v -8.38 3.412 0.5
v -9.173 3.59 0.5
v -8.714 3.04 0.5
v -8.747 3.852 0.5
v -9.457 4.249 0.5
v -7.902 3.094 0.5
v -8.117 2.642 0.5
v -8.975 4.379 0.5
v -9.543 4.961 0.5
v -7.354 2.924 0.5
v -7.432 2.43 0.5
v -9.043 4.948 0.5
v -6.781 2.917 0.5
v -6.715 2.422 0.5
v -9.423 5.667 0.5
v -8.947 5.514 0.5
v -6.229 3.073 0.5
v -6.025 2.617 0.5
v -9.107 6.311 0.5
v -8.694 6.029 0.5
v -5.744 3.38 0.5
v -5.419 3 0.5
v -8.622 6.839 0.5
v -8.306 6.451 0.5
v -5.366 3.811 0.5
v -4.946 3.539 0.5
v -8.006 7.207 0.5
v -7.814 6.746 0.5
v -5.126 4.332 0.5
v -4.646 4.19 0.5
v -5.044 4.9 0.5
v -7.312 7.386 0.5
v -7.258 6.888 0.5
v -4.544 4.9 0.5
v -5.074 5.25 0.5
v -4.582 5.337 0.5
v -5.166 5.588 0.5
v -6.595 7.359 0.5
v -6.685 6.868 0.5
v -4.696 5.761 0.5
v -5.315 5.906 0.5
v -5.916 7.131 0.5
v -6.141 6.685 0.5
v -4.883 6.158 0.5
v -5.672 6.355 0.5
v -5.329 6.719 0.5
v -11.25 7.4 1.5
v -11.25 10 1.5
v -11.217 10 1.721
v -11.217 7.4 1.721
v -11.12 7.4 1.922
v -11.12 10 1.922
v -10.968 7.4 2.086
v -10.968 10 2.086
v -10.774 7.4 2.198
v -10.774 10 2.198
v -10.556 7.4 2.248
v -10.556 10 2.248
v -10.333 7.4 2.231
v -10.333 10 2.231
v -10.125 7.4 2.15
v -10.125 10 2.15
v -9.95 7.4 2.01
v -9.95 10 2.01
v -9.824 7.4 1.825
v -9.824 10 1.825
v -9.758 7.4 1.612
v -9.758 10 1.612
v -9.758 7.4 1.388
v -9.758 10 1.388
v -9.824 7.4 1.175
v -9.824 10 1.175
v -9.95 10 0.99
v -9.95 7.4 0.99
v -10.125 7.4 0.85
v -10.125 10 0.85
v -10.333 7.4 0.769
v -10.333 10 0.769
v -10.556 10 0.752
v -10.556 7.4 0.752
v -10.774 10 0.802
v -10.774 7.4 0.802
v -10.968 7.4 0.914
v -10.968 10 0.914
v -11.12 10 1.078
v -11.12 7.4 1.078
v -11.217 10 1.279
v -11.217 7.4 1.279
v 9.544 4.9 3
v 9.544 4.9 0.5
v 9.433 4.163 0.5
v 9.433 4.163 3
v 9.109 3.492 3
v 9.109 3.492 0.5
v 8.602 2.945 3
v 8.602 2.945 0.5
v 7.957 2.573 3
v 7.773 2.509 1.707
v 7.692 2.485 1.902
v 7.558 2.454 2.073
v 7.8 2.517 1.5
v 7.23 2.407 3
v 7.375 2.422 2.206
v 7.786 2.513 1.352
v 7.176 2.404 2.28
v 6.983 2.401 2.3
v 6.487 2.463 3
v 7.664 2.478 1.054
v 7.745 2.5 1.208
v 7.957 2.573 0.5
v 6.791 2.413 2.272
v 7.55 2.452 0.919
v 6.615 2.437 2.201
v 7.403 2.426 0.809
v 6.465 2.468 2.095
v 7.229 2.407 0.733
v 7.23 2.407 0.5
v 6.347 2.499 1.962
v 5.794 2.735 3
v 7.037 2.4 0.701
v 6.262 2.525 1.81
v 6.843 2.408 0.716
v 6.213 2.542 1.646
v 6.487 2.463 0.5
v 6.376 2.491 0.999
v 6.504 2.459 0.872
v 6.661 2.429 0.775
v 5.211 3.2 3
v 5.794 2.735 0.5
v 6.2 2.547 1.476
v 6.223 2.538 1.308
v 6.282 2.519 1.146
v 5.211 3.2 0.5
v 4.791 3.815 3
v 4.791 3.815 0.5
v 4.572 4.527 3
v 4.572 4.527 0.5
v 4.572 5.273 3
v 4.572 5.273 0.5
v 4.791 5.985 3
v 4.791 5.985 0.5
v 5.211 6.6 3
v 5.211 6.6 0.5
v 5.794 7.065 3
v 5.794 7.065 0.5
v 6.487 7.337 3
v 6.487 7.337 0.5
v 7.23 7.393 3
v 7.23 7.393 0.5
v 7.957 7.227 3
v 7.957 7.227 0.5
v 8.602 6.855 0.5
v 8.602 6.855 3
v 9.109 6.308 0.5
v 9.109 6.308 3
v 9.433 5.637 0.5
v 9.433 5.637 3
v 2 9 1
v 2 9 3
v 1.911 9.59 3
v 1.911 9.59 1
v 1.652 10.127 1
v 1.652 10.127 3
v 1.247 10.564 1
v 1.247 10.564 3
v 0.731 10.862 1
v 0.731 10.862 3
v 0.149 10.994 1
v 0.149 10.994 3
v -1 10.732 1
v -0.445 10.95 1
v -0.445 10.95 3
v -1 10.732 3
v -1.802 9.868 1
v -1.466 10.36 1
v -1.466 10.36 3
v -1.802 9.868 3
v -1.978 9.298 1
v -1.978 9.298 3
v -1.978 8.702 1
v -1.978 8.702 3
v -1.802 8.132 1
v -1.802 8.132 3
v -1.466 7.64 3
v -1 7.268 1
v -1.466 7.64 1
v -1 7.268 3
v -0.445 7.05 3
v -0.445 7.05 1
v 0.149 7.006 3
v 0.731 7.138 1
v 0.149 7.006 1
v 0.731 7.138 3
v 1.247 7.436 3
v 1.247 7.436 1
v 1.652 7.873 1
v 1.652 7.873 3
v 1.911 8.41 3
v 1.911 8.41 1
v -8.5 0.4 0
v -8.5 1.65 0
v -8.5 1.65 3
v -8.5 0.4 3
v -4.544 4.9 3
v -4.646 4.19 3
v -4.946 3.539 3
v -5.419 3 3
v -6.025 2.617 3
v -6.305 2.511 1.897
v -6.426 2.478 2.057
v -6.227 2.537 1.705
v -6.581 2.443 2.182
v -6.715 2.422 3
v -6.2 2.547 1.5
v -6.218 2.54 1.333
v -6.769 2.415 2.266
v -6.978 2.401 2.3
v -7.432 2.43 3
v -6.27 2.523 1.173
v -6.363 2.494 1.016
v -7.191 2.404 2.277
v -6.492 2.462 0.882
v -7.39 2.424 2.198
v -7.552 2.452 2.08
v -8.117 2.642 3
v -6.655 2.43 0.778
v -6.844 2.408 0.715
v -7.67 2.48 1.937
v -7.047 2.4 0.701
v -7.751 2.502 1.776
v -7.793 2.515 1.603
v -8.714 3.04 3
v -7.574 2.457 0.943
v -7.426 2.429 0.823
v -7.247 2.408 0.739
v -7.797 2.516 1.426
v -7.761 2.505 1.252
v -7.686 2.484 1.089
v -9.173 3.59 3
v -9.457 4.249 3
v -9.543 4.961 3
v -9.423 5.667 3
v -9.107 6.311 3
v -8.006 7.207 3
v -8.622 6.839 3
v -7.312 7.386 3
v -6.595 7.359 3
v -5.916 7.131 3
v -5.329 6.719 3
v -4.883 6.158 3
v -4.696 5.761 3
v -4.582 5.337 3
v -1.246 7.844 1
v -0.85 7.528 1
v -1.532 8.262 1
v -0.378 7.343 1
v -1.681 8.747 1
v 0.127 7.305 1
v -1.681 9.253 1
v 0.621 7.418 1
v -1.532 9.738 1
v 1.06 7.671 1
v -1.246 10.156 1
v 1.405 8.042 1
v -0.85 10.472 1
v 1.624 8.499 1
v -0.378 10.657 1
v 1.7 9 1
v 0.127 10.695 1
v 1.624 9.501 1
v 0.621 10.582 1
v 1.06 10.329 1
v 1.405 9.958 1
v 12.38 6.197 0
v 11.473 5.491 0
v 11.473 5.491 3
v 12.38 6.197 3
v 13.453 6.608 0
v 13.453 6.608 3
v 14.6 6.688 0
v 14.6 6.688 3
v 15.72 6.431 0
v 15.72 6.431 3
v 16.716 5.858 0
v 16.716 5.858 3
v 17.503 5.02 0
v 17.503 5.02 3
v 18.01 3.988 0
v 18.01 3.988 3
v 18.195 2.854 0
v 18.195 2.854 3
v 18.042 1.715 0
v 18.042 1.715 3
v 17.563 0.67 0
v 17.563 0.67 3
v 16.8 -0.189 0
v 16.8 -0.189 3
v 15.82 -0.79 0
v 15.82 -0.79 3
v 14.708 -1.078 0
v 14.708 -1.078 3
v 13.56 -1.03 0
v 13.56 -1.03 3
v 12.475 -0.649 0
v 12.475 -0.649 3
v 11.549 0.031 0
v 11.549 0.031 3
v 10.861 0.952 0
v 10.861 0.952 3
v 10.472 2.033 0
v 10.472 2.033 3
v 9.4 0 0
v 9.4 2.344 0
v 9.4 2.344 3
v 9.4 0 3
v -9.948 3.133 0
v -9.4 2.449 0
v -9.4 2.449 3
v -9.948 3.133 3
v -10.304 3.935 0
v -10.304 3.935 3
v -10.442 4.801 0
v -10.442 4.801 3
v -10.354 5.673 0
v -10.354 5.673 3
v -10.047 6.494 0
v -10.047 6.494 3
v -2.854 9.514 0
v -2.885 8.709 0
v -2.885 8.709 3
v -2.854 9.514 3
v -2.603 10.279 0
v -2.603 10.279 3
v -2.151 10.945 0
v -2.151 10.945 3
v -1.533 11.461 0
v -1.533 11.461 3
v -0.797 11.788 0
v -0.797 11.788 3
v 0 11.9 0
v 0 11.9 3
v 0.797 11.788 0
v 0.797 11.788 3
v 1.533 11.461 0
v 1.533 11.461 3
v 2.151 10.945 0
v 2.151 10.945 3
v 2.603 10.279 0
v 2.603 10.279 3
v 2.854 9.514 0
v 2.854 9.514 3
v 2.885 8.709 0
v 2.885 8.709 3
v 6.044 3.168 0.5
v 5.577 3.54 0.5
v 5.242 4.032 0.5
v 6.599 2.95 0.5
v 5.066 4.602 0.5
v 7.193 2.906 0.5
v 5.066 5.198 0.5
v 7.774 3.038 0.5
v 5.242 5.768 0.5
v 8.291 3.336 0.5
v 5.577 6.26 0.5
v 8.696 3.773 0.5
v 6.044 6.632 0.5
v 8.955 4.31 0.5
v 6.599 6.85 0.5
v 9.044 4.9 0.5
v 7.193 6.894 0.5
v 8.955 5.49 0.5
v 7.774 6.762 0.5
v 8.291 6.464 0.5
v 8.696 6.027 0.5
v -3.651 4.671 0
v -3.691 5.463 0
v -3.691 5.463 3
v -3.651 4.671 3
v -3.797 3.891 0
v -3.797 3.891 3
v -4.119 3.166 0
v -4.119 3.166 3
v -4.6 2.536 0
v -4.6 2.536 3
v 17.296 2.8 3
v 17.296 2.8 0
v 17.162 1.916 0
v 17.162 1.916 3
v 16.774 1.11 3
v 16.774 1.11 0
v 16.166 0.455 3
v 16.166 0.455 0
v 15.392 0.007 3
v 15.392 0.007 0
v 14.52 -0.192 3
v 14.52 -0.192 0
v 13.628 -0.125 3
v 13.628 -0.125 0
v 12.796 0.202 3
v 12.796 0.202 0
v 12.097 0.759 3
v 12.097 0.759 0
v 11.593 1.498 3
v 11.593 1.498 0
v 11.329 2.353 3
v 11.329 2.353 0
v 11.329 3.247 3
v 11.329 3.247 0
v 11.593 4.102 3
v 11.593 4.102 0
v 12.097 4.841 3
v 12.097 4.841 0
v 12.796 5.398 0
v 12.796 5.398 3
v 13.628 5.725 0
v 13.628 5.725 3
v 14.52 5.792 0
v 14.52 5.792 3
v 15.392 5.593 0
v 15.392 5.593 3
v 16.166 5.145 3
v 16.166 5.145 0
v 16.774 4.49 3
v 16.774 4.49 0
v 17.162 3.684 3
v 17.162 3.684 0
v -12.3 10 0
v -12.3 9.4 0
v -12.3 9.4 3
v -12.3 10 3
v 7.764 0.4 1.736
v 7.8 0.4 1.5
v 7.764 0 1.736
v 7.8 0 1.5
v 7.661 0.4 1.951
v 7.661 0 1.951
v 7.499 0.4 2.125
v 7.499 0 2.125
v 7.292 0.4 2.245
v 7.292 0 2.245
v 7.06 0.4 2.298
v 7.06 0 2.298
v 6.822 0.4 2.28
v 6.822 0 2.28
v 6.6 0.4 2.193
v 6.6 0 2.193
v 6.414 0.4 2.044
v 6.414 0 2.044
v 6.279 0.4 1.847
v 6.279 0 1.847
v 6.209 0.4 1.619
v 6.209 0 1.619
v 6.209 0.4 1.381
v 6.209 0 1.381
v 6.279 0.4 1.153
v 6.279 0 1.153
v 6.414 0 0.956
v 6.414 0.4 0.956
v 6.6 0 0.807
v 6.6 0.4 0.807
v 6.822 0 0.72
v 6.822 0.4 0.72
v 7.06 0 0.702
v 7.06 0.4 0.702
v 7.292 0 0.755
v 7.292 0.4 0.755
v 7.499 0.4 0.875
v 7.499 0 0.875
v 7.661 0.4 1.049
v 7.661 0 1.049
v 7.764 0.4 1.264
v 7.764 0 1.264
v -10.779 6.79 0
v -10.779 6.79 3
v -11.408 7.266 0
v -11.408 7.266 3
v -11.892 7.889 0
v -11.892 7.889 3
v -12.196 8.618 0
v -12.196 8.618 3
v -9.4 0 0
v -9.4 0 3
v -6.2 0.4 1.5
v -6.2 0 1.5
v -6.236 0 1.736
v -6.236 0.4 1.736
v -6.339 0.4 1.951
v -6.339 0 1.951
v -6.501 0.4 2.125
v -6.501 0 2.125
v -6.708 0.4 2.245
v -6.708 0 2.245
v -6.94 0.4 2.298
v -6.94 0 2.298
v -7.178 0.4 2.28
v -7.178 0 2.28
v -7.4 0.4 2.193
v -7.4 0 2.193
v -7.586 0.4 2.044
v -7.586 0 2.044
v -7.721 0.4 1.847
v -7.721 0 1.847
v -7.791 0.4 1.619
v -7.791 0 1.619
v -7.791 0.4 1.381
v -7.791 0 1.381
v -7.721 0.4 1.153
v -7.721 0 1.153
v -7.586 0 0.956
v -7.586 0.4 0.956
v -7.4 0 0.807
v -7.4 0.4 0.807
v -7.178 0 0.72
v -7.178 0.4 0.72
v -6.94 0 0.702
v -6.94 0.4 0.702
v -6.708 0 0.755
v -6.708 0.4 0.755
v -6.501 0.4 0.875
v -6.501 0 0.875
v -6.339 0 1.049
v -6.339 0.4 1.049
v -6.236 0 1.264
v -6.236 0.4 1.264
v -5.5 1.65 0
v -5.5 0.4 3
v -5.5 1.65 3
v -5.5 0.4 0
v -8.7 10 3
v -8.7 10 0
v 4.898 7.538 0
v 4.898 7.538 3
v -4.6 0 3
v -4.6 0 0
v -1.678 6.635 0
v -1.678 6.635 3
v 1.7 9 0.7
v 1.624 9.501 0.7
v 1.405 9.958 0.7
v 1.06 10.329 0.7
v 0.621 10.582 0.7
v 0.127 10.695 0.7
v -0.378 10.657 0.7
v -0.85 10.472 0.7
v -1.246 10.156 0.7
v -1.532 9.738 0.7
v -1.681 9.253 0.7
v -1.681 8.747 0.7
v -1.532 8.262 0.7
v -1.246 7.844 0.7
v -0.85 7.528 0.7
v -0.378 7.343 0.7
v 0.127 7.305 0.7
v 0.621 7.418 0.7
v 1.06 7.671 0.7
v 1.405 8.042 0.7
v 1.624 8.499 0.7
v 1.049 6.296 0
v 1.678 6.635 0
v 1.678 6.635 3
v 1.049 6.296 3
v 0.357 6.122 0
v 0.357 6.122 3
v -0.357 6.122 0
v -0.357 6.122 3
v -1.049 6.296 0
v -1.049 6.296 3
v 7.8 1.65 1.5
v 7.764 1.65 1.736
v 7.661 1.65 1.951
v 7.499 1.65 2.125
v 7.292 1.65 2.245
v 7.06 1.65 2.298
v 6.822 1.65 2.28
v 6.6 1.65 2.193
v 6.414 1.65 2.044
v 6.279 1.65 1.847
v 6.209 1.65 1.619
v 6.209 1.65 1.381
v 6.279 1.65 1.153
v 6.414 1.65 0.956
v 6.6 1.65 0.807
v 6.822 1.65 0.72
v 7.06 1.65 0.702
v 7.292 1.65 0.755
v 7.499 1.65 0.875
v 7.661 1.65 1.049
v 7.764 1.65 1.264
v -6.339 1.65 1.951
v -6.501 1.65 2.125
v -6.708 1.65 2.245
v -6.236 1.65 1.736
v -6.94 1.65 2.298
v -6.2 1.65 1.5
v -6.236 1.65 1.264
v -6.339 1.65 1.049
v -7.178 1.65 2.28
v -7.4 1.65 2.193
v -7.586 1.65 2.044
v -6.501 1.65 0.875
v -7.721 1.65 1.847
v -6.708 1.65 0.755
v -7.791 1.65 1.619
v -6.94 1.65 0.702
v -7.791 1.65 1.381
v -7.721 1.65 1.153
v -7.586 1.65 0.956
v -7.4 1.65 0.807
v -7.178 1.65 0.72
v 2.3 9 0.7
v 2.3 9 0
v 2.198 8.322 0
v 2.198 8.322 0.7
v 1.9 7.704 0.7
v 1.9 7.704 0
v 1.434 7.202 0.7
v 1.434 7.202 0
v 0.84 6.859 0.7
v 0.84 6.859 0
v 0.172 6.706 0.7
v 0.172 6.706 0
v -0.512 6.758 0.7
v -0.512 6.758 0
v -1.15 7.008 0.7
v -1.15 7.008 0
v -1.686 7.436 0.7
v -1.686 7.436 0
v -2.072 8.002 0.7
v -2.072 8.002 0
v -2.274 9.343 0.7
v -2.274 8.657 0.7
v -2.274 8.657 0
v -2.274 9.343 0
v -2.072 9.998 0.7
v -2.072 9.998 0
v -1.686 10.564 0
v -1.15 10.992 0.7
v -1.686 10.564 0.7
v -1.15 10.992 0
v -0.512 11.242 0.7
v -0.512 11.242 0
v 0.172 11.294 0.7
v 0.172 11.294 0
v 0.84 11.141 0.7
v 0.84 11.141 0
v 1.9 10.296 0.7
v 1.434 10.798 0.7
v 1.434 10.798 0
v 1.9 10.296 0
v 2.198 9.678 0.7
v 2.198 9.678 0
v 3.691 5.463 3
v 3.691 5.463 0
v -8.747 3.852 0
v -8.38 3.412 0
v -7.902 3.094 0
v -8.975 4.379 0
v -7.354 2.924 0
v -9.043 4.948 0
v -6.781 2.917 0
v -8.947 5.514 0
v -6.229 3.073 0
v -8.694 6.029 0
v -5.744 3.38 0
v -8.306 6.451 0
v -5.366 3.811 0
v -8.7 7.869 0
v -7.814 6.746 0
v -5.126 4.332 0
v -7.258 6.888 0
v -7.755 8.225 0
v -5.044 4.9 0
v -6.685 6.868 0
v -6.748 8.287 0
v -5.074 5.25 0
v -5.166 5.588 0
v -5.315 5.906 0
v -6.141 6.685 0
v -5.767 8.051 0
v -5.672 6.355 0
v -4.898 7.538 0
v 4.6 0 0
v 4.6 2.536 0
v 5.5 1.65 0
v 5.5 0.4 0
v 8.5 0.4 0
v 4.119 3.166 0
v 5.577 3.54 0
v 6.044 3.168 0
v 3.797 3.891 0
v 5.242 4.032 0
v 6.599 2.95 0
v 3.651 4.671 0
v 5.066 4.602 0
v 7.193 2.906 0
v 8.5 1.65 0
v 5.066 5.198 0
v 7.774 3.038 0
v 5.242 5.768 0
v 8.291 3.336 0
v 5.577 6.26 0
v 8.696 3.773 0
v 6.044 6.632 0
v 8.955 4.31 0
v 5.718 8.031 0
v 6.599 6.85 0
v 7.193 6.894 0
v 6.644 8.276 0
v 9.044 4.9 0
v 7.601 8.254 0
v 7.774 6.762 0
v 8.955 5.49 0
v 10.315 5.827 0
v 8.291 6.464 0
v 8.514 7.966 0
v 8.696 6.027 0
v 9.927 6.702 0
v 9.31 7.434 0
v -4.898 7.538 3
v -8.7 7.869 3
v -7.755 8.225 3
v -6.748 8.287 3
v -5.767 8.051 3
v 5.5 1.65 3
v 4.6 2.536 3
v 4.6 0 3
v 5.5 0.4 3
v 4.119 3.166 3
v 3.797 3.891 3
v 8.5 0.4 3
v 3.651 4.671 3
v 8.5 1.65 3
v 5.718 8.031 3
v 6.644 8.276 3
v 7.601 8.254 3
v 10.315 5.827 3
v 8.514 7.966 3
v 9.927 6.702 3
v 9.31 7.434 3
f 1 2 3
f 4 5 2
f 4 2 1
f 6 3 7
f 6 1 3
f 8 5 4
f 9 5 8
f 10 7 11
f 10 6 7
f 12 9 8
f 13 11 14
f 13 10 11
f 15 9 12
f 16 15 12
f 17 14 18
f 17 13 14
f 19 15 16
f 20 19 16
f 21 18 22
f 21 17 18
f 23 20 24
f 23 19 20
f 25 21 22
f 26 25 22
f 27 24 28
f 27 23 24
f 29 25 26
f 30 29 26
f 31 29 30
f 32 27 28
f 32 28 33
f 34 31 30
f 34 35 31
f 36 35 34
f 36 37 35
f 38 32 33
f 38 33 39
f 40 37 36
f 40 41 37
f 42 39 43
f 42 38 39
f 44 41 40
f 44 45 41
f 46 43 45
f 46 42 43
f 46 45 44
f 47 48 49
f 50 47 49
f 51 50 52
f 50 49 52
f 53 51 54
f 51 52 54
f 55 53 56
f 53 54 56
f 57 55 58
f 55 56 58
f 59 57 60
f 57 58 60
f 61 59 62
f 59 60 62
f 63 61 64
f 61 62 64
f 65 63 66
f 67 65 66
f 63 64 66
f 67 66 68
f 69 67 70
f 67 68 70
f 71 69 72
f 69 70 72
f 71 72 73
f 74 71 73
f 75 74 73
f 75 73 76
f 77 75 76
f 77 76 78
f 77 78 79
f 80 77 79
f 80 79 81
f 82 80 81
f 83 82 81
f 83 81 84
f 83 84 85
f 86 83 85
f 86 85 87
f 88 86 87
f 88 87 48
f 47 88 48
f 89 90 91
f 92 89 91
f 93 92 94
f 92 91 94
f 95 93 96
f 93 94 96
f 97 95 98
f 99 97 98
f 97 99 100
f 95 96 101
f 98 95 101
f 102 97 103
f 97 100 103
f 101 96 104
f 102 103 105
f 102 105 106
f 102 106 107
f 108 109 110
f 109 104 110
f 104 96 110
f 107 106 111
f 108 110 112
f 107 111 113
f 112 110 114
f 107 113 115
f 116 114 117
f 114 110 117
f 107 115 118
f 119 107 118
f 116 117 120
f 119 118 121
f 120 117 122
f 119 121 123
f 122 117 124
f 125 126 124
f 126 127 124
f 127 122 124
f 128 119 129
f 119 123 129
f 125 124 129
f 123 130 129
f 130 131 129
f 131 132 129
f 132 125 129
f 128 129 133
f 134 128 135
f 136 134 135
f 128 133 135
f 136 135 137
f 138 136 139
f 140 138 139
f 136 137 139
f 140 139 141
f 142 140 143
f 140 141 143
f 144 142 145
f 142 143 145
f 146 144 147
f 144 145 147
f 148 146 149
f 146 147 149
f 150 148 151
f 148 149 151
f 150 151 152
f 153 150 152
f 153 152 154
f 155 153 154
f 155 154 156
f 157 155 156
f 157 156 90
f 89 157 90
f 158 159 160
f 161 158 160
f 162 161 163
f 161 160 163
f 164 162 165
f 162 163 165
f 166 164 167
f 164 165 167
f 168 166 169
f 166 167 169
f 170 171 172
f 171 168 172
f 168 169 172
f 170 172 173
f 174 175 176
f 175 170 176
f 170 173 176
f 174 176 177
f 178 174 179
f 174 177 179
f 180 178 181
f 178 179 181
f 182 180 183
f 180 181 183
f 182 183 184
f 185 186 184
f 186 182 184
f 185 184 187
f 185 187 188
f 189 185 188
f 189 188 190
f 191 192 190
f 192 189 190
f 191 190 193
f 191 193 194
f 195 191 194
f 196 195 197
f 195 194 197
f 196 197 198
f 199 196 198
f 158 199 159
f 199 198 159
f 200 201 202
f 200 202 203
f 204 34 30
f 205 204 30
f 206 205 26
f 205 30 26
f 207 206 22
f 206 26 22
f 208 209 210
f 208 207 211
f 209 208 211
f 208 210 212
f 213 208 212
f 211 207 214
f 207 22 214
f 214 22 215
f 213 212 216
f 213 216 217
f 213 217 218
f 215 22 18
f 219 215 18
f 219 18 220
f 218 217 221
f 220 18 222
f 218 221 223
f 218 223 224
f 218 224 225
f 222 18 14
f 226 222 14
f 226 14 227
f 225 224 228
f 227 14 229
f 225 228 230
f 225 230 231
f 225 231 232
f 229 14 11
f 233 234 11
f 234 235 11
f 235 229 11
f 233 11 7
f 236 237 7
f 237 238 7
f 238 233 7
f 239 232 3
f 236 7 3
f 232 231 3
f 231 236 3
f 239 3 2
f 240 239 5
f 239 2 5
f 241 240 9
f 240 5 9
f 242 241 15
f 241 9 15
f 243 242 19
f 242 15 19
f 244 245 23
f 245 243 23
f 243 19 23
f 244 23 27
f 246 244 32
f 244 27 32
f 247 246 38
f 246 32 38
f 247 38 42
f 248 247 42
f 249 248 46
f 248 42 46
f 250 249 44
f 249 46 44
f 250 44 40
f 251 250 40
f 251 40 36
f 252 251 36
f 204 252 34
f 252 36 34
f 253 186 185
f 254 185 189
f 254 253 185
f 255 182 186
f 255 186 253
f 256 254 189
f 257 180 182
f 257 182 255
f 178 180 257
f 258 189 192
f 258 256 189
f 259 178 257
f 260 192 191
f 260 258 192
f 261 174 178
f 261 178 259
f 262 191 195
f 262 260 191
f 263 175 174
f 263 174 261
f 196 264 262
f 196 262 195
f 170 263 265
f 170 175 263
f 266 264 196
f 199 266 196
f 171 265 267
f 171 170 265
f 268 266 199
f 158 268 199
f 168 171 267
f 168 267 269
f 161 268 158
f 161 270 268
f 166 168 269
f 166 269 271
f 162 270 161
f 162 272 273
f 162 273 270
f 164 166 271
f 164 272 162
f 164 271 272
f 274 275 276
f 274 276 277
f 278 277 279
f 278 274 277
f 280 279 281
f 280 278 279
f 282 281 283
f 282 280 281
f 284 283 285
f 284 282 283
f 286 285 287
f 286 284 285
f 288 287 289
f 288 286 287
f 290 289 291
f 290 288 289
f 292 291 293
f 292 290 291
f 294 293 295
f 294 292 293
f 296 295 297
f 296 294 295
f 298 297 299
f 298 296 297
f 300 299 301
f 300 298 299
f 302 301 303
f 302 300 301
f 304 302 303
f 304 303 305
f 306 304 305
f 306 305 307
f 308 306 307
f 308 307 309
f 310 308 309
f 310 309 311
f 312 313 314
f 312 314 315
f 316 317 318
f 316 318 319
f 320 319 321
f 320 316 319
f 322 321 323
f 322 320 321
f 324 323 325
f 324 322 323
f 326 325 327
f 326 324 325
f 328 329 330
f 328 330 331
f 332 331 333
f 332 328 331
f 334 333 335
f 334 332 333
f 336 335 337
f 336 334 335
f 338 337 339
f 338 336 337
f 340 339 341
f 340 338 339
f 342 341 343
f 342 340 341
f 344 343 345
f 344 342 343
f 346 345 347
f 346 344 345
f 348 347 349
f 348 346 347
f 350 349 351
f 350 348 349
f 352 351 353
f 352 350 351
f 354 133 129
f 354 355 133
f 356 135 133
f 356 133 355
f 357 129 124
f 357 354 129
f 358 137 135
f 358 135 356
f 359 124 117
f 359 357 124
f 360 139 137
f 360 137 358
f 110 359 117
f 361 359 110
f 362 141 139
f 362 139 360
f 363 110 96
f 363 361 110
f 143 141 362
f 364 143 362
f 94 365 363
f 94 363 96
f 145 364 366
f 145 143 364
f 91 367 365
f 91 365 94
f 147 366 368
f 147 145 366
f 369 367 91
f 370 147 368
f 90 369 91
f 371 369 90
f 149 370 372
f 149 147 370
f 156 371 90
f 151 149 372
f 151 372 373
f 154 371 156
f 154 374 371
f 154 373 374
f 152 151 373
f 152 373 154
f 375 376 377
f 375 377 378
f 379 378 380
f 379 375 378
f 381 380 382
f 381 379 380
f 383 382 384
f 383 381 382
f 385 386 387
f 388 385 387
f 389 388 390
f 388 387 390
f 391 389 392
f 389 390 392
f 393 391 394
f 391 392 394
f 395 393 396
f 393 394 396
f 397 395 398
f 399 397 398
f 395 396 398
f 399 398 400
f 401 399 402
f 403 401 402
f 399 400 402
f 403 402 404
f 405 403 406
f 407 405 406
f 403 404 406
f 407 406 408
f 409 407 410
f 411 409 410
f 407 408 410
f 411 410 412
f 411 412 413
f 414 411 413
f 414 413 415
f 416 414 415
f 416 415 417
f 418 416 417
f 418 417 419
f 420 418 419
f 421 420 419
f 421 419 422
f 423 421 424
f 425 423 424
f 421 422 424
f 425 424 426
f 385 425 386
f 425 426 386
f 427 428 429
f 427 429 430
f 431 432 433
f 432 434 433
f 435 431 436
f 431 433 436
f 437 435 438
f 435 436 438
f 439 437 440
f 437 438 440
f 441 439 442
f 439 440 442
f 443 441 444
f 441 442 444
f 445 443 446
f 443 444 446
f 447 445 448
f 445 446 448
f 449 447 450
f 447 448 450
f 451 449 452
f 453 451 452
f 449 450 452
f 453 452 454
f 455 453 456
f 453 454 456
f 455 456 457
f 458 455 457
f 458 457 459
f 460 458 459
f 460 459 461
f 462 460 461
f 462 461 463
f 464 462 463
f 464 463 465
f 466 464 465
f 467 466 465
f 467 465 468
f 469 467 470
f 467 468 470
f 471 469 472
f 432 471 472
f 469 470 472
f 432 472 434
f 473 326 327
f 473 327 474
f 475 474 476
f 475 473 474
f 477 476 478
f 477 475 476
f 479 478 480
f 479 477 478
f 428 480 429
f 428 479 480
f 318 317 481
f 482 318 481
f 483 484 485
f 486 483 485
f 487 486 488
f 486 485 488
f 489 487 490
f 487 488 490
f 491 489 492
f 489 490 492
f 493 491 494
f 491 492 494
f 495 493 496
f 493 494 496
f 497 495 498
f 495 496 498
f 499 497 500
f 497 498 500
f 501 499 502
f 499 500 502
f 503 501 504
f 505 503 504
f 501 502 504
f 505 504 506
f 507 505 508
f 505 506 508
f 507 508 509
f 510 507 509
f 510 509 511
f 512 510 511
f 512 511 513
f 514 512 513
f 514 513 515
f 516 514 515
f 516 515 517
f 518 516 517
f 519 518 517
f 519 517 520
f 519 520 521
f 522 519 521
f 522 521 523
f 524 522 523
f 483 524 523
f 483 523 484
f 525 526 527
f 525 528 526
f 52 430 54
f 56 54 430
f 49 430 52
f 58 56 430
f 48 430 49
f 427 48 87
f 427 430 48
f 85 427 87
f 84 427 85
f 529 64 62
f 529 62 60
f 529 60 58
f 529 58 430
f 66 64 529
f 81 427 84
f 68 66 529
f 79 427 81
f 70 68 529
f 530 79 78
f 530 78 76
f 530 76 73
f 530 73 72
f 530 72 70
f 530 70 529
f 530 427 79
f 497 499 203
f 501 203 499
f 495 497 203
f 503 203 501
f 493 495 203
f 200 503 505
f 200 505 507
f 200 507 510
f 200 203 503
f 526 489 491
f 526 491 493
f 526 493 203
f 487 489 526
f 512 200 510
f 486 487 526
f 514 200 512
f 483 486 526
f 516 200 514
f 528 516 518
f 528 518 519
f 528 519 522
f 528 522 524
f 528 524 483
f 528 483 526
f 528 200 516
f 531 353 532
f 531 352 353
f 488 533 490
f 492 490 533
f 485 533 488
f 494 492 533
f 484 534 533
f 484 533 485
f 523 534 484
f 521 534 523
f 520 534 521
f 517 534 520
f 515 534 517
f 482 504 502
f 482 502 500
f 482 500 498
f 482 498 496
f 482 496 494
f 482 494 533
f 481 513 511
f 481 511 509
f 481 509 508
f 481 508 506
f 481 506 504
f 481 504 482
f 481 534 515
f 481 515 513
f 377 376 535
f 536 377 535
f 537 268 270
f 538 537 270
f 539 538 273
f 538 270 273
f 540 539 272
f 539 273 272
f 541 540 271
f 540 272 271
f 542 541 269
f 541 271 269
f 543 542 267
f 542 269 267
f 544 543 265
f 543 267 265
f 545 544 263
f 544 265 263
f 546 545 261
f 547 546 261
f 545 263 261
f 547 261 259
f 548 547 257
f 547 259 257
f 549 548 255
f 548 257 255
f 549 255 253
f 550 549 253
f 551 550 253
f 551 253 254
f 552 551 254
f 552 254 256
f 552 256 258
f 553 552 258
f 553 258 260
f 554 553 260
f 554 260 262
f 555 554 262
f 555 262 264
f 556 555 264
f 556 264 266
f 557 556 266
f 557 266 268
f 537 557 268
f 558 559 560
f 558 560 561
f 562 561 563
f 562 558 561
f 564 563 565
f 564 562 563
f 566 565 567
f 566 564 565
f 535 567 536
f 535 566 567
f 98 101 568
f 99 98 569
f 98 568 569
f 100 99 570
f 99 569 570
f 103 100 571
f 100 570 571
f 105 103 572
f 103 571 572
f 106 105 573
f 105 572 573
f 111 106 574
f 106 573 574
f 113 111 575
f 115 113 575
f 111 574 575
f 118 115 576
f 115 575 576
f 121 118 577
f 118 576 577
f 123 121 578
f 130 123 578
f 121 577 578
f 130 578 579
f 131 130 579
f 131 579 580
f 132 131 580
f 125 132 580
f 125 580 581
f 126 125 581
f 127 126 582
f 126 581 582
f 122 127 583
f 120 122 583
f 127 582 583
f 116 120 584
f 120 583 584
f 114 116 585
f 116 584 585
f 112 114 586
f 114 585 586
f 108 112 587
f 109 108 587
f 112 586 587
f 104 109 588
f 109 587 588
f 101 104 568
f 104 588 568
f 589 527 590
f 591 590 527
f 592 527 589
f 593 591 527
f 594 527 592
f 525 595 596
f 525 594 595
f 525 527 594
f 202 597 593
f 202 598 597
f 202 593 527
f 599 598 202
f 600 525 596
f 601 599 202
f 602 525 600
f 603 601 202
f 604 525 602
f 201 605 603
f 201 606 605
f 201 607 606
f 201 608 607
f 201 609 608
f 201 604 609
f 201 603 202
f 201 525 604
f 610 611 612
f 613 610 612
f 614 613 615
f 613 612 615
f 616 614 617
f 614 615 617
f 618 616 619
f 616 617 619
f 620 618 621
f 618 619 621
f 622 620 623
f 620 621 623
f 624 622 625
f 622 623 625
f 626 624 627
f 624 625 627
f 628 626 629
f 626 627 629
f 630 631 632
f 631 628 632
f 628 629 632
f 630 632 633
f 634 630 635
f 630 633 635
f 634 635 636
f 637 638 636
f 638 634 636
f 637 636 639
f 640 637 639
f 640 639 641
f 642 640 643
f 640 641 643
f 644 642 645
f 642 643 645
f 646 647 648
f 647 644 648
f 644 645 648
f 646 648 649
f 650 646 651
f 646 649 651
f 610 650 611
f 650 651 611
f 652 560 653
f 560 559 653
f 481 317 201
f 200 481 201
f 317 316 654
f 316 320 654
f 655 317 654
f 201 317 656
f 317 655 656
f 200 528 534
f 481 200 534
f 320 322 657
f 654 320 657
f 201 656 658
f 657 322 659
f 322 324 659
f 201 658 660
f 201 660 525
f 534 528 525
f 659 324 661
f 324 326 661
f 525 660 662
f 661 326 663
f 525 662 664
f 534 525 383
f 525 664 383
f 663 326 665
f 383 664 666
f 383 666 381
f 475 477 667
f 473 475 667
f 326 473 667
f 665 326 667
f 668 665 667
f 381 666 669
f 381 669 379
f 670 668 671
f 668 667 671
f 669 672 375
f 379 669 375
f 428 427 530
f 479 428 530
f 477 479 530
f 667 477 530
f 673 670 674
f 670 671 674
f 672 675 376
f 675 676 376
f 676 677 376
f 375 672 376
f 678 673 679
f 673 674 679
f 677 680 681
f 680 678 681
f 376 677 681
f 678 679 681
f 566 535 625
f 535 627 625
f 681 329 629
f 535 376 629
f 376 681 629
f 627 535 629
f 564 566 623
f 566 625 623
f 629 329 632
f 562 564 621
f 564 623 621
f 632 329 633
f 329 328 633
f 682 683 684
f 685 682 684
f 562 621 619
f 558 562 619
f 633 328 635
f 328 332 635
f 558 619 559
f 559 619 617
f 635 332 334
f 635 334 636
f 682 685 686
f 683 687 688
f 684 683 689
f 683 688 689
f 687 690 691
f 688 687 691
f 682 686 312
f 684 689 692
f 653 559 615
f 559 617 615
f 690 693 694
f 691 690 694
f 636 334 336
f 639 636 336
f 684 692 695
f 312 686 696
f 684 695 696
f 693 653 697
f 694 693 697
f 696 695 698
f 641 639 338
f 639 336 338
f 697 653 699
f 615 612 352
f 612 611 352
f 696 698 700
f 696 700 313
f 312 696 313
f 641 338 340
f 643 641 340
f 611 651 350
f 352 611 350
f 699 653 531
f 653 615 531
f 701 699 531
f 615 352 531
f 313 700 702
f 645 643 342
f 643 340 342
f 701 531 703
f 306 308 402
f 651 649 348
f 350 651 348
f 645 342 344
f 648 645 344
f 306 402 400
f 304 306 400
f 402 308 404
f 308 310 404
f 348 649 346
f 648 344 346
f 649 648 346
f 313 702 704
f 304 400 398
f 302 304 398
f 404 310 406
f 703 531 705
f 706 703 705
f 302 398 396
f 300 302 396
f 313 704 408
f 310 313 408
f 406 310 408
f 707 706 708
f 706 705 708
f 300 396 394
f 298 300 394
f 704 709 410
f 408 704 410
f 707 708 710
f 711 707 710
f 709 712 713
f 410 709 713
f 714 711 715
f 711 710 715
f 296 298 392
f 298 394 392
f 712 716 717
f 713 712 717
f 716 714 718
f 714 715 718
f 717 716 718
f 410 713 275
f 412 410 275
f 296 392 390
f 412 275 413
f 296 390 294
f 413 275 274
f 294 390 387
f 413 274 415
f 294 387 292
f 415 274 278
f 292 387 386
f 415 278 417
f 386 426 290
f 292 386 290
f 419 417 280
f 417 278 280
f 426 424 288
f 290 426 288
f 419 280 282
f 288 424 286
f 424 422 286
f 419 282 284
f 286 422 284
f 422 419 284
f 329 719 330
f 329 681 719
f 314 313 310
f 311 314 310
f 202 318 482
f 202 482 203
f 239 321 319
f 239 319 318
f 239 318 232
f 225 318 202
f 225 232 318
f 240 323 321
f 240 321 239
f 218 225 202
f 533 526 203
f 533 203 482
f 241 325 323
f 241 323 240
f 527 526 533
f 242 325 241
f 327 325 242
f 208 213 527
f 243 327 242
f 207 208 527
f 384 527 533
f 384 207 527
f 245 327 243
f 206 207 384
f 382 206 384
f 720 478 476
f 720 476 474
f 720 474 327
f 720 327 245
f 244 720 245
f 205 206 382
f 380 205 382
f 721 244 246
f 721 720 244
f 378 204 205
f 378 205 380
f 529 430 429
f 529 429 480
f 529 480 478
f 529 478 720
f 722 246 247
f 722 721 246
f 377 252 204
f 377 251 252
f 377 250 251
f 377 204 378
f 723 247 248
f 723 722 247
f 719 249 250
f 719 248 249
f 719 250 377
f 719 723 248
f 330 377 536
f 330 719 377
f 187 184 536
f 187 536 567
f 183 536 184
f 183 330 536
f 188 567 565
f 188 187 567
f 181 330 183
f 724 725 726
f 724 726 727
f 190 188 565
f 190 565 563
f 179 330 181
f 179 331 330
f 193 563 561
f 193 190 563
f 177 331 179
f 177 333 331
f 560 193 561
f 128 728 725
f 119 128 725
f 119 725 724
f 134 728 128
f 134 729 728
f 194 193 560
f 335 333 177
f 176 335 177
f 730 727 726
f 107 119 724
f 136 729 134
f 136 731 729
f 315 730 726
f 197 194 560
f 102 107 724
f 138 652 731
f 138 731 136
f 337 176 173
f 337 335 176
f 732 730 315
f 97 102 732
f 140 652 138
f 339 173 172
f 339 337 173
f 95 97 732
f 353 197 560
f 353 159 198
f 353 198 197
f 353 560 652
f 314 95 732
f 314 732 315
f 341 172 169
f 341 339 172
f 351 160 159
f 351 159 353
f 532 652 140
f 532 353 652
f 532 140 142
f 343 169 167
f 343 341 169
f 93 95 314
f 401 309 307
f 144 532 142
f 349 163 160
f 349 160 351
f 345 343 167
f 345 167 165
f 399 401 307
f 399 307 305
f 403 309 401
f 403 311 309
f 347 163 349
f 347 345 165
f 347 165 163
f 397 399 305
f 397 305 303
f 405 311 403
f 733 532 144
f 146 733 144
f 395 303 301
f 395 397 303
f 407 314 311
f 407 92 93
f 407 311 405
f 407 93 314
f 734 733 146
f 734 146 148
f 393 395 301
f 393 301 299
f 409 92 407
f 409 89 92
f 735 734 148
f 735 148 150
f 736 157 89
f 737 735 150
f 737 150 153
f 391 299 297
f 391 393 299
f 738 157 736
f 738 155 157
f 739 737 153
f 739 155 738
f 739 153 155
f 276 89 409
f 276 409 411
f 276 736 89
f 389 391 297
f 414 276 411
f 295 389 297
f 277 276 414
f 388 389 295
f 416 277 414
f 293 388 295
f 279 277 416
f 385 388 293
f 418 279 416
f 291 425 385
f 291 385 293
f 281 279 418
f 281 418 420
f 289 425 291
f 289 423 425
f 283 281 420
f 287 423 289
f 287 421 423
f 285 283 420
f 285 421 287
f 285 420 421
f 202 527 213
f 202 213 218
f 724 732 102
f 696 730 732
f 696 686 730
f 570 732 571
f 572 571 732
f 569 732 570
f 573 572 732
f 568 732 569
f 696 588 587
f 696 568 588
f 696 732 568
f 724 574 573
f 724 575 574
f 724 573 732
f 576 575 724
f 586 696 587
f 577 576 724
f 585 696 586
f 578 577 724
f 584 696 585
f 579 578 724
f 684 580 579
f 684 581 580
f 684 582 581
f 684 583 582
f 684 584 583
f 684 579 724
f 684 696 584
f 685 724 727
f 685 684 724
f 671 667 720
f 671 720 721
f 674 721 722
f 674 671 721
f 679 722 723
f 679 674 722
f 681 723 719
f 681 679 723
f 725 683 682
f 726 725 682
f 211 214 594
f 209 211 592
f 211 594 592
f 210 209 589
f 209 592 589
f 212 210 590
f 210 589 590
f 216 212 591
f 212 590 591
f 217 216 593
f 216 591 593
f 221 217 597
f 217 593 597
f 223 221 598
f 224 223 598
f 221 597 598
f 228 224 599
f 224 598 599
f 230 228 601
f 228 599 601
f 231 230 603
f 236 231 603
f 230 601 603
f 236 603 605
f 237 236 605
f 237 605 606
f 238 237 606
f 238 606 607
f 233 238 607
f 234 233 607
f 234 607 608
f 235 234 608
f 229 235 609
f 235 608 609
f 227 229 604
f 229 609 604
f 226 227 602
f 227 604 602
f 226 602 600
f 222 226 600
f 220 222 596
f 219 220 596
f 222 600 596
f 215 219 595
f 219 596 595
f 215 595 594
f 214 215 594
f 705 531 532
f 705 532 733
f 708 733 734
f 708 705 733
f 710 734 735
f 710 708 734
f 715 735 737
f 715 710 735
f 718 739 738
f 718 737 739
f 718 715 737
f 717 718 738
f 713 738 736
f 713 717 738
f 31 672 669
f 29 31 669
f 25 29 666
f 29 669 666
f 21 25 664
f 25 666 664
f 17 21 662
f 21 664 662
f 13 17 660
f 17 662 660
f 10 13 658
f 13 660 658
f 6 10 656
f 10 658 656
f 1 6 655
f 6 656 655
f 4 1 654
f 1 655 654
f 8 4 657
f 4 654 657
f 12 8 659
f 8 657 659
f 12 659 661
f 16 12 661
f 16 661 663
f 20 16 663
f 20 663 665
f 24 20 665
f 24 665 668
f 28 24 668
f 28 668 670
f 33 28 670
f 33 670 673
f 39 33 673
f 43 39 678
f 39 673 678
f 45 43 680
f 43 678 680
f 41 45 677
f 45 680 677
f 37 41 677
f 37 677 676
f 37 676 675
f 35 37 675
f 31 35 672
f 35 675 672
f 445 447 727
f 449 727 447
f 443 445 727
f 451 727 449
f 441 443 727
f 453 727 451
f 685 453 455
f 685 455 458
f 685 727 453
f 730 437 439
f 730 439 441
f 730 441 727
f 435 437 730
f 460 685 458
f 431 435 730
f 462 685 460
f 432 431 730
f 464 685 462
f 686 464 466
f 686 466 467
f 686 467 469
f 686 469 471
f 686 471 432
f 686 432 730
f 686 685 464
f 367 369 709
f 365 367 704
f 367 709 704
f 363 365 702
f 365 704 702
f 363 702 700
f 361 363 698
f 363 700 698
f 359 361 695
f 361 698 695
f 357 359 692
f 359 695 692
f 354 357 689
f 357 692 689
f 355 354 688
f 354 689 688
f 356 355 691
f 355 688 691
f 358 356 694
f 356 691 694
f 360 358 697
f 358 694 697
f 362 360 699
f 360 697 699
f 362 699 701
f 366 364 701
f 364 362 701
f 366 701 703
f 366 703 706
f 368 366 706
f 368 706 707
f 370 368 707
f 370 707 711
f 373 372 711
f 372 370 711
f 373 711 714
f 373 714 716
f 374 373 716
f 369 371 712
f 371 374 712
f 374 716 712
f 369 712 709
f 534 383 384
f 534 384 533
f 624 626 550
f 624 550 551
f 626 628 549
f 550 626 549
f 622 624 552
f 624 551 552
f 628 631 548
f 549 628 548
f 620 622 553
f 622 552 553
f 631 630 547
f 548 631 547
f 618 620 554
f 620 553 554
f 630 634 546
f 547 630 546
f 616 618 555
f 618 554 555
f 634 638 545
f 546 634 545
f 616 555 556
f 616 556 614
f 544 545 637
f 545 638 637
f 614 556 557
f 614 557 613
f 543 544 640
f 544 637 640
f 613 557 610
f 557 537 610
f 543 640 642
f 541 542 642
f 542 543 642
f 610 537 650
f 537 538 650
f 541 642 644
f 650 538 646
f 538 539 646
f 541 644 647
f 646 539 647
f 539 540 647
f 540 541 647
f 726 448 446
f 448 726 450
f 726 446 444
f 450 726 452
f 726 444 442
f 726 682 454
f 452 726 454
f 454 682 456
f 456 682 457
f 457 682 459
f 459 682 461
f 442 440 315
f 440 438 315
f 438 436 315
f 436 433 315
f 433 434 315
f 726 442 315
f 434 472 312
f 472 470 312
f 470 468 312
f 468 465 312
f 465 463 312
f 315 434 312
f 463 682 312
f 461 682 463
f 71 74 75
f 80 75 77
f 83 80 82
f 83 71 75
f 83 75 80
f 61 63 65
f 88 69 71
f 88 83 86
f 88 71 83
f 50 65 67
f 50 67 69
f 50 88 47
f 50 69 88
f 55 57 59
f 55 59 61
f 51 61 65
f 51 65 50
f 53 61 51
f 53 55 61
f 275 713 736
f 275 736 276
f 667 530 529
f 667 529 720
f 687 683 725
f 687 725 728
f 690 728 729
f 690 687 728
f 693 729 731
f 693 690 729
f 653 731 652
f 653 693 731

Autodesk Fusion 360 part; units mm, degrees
sketch "スケッチ1" plane through (0, 0, 0) normal (0, 0, 1) x (1, 0, 0)
  line L0 (0, 0) -> (18.1957, 0)
  line L1 (18.1957, 0) -> (18.1957, 13.2439)
  line L2 (18.1957, 13.2439) -> (0, 13.2439)
  line L3 (0, 13.2439) -> (0, 0)
  line L4 (0, 0) -> (-13.9996, 0)
  line L5 (-13.9996, 0) -> (-13.9996, 13.2439)
  line L6 (-13.9996, 13.2439) -> (0, 13.2439)
  line L7 (0, 13.2439) -> (0, 0)
  circle A0 centre (-7.0436, 4.9) radius 2
  circle A1 centre (7.0436, 4.9) radius 2
  circle A2 centre (0, 9) radius 2
  circle A3 centre (14.2957, 2.8) radius 3
  circle A4 centre (-7.0436, 4.9) radius 2.5
  circle A5 centre (7.0436, 4.9) radius 2.5
  circle A6 centre (0, 9) radius 2.3
  circle A7 centre (0, 9) radius 1.7
  line L8 (-7, 1.5003) -> (-7, 0)
  line L9 (7, 1.5003) -> (7, 0)
  circle A8 centre (-7.0436, 4.9) radius 3.4
  circle A9 centre (0, 9) radius 2.9
  line L10 (-7.0436, 4.9) -> (0, 9)
  line L11 (0, 9) -> (7.0436, 4.9)
  line L12 (7.0436, 4.9) -> (14.2957, 2.8)
  circle A10 centre (7.0436, 4.9) radius 3.4
  circle A11 centre (14.2957, 2.8) radius 3.9
  line L13 (-4.6, 2.5359) -> (-4.6, 0)
  line L14 (4.6, 2.5359) -> (4.6, 0)
  line L15 (-9.4, 2.449) -> (-9.4, 0)
  line L16 (9.4, 2.449) -> (9.4, 0)
  line L17 (-3.6906, 5.4633) -> (-1.678, 6.6348)
  line L18 (1.678, 6.6348) -> (3.6906, 5.4633)
  line L19 (-4.898, 7.5375) -> (-2.8854, 8.709)
  line L20 (2.8854, 8.709) -> (4.898, 7.5375)
  line L21 (10.3149, 5.8267) -> (11.4731, 5.4913)
  line L22 (9.3136, 2.3687) -> (10.4718, 2.0333)
  line L23 (0, 0) -> (18.1957, 0)
  line L24 (18.1957, 0) -> (18.1957, -2.0683)
  line L25 (18.1957, -2.0683) -> (0, -2.0683)
  line L26 (-13.9996, 0) -> (0, 0)
  line L27 (0, -2.0683) -> (-13.9996, -2.0683)
  line L28 (-13.9996, -2.0683) -> (-13.9996, 0)
  line L29 (-12.3, 6.4) -> (-12.3, 10)
  line L30 (-12.3, 10) -> (-8.7, 10)
  line L31 (-8.7, 10) -> (-8.7, 7.8692)
  line L32 (-12.3, 6.4) -> (-10.0948, 6.4)
  line L33 (-5.5, 1.65) -> (-8.5, 1.65)
  line L34 (-8.5, 1.65) -> (-8.5, 0.4)
  line L35 (-8.5, 0.4) -> (-5.5, 0.4)
  line L36 (-5.5, 0.4) -> (-5.5, 1.65)
  line L37 (-5.5, 1.65) -> (-8.5, 0.4) construction
  line L38 (-8.5, 1.65) -> (-5.5, 0.4) construction
  line L39 (8.5, 1.65) -> (5.5, 1.65)
  line L40 (5.5, 1.65) -> (5.5, 0.4)
  line L41 (5.5, 0.4) -> (8.5, 0.4)
  line L42 (8.5, 0.4) -> (8.5, 1.65)
  line L43 (8.5, 1.65) -> (5.5, 0.4) construction
  line L44 (5.5, 1.65) -> (8.5, 0.4) construction
  arc A12 (-12.3, 9.4) -> (-9.3, 6.4) centre (-9.3, 9.4) ccw
  point P0 (-7, 1.5003)
  point P1 (7, 1.5003)
  point P2 (-10.5, 10)
  point P3 (-7, 1.025)
  point P4 (7, 1.025)
  dimension "d4" = 4
  dimension "d5" = 4.9
  dimension "d6" = 8.15
  dimension "d7" = 4
  dimension "d10" = 6
  dimension "d16" = 2.8
  dimension "d18" = 9
  dimension "d19" = 5
  dimension "d21" = 7.55
  dimension "d26" = 4.6
  dimension "d34" = 3.4
  dimension "d41" = 7
  dimension "d45" = 5.8
  dimension "d51" = 1.2
  dimension "d52" = 4.8
  dimension "d54" = 1.8
  dimension "d57" = 6.8
  dimension "d76" = 7.8
  dimension "d86" = 10.5
  dimension "d87" = 3.6
  dimension "d88" = 10
  dimension "d92" = 3
  dimension "d93" = 0.4
  dimension "d94" = 1.25
  dimension "d96" = 3.6
  dimension "d97" = 3
extrude "押し出し1" add sketch "スケッチ1" along normal blind 3 contours L0 L9 A10 L14 L23 L39 L40 L41 | L3 L7 A6 A9 L10 | L3 L7 A6 A9 L11 | L4 L8 A8 L13 L26 L33 L35 L36 | L0 L9 A10 L16 L22 L23 L39 L41 L42 | A5 L11 L12 A10 L39 | A8 A9 L10 L17 | A9 L11 A10 L18 | L4 L8 A8 L15 L26 L33 L34 L35 | A8 L33 | L3 L7 A6 A9 L10 | L3 L7 A6 A9 L11 | A8 A9 L10 L19 | A9 L11 A10 L20 | L0 A3 L12 A11 L23 | L0 A3 A11 L23 | A10 L16 L22 | L12 A10 A11 L16 L22 | A5 L11 L12 A10 | L0 A3 L12 A11 L23 | L12 A10 A11 L21 | A8 L29 L30 L31 A12 picked at (-7.0875, 1.9012)
extrude "押し出し2" add sketch "スケッチ1" along normal blind 0.5 contours A4 | A1 A5 L11 L12 | A1 A5 L11 L12
extrude "押し出し5" add sketch "スケッチ1" against normal blind 2.3 from surface at 3 contours L3 L7 A2 A6 L10 | L3 L7 A2 A6 L11 | L3 L7 A2 A6 L10 | L3 L7 A2 A6 L11
sketch "スケッチ2" plane through (0, 0, 0) normal (0, -1, 0) x (1, 0, 0)
  line L0 (-7, 0) -> (-7, 3)
  line L1 (7, 0) -> (7, 3)
  circle A0 centre (-7, 1.5) radius 0.8
  circle A1 centre (7, 1.5) radius 0.8
  line L2 (9.4, 0) -> (9.4, 3)
  line L3 (4.6, 3) -> (4.6, 0)
  line L4 (-4.6, 3) -> (-9.4, 3)
  line L5 (4.6, 0) -> (9.4, 0)
  line L6 (-4.6, 0) -> (-4.6, 3)
  line L7 (-9.4, 3) -> (-9.4, 0)
  line L8 (9.4, 3) -> (4.6, 3)
  line L9 (-9.4, 0) -> (-4.6, 0)
  point P0 (7, 0)
  dimension "d42" = 1.6
extrude "押し出し7" cut sketch "スケッチ2" against normal blind 3 contours L0 A0 | L0 A0 | L1 A1 | L1 A1
extrude "押し出し8" add sketch "スケッチ1" against normal blind 0.3 from surface at 1 contours L3 L7 A2 A7 L10 | L3 L7 A2 A7 L11 | L3 L7 A2 A7 L10 | L3 L7 A2 A7 L11
sketch "スケッチ6" plane through (0, 10, 0) normal (0, 1, 0) x (-1, 0, 0)
  line L0 (8.7, 0) -> (12.3, 0)
  line L1 (12.3, 0) -> (12.3, 3)
  line L2 (12.3, 3) -> (8.7, 3)
  line L3 (8.7, 3) -> (8.7, 0)
  line L4 (10.5, 3) -> (10.5, 0)
  circle A0 centre (10.5, 1.5) radius 0.75
  dimension "d89" = 1.5
extrude "押し出し12" cut sketch "スケッチ6" against normal blind 2.6 contours L4 A0 | L4 A0
equation "d5 = 6.5 mm - 0.6 mm - 1.0 mm"
equation "d6 = 6.15 mm + 1.95 mm + 0.05 mm"
equation "d16 = ( 7.8 / 2 ) * 1 mm - 0.6 mm - 0.5 mm"
equation "d21 = 6.15 mm + 1.35 mm + 0.05 mm"
